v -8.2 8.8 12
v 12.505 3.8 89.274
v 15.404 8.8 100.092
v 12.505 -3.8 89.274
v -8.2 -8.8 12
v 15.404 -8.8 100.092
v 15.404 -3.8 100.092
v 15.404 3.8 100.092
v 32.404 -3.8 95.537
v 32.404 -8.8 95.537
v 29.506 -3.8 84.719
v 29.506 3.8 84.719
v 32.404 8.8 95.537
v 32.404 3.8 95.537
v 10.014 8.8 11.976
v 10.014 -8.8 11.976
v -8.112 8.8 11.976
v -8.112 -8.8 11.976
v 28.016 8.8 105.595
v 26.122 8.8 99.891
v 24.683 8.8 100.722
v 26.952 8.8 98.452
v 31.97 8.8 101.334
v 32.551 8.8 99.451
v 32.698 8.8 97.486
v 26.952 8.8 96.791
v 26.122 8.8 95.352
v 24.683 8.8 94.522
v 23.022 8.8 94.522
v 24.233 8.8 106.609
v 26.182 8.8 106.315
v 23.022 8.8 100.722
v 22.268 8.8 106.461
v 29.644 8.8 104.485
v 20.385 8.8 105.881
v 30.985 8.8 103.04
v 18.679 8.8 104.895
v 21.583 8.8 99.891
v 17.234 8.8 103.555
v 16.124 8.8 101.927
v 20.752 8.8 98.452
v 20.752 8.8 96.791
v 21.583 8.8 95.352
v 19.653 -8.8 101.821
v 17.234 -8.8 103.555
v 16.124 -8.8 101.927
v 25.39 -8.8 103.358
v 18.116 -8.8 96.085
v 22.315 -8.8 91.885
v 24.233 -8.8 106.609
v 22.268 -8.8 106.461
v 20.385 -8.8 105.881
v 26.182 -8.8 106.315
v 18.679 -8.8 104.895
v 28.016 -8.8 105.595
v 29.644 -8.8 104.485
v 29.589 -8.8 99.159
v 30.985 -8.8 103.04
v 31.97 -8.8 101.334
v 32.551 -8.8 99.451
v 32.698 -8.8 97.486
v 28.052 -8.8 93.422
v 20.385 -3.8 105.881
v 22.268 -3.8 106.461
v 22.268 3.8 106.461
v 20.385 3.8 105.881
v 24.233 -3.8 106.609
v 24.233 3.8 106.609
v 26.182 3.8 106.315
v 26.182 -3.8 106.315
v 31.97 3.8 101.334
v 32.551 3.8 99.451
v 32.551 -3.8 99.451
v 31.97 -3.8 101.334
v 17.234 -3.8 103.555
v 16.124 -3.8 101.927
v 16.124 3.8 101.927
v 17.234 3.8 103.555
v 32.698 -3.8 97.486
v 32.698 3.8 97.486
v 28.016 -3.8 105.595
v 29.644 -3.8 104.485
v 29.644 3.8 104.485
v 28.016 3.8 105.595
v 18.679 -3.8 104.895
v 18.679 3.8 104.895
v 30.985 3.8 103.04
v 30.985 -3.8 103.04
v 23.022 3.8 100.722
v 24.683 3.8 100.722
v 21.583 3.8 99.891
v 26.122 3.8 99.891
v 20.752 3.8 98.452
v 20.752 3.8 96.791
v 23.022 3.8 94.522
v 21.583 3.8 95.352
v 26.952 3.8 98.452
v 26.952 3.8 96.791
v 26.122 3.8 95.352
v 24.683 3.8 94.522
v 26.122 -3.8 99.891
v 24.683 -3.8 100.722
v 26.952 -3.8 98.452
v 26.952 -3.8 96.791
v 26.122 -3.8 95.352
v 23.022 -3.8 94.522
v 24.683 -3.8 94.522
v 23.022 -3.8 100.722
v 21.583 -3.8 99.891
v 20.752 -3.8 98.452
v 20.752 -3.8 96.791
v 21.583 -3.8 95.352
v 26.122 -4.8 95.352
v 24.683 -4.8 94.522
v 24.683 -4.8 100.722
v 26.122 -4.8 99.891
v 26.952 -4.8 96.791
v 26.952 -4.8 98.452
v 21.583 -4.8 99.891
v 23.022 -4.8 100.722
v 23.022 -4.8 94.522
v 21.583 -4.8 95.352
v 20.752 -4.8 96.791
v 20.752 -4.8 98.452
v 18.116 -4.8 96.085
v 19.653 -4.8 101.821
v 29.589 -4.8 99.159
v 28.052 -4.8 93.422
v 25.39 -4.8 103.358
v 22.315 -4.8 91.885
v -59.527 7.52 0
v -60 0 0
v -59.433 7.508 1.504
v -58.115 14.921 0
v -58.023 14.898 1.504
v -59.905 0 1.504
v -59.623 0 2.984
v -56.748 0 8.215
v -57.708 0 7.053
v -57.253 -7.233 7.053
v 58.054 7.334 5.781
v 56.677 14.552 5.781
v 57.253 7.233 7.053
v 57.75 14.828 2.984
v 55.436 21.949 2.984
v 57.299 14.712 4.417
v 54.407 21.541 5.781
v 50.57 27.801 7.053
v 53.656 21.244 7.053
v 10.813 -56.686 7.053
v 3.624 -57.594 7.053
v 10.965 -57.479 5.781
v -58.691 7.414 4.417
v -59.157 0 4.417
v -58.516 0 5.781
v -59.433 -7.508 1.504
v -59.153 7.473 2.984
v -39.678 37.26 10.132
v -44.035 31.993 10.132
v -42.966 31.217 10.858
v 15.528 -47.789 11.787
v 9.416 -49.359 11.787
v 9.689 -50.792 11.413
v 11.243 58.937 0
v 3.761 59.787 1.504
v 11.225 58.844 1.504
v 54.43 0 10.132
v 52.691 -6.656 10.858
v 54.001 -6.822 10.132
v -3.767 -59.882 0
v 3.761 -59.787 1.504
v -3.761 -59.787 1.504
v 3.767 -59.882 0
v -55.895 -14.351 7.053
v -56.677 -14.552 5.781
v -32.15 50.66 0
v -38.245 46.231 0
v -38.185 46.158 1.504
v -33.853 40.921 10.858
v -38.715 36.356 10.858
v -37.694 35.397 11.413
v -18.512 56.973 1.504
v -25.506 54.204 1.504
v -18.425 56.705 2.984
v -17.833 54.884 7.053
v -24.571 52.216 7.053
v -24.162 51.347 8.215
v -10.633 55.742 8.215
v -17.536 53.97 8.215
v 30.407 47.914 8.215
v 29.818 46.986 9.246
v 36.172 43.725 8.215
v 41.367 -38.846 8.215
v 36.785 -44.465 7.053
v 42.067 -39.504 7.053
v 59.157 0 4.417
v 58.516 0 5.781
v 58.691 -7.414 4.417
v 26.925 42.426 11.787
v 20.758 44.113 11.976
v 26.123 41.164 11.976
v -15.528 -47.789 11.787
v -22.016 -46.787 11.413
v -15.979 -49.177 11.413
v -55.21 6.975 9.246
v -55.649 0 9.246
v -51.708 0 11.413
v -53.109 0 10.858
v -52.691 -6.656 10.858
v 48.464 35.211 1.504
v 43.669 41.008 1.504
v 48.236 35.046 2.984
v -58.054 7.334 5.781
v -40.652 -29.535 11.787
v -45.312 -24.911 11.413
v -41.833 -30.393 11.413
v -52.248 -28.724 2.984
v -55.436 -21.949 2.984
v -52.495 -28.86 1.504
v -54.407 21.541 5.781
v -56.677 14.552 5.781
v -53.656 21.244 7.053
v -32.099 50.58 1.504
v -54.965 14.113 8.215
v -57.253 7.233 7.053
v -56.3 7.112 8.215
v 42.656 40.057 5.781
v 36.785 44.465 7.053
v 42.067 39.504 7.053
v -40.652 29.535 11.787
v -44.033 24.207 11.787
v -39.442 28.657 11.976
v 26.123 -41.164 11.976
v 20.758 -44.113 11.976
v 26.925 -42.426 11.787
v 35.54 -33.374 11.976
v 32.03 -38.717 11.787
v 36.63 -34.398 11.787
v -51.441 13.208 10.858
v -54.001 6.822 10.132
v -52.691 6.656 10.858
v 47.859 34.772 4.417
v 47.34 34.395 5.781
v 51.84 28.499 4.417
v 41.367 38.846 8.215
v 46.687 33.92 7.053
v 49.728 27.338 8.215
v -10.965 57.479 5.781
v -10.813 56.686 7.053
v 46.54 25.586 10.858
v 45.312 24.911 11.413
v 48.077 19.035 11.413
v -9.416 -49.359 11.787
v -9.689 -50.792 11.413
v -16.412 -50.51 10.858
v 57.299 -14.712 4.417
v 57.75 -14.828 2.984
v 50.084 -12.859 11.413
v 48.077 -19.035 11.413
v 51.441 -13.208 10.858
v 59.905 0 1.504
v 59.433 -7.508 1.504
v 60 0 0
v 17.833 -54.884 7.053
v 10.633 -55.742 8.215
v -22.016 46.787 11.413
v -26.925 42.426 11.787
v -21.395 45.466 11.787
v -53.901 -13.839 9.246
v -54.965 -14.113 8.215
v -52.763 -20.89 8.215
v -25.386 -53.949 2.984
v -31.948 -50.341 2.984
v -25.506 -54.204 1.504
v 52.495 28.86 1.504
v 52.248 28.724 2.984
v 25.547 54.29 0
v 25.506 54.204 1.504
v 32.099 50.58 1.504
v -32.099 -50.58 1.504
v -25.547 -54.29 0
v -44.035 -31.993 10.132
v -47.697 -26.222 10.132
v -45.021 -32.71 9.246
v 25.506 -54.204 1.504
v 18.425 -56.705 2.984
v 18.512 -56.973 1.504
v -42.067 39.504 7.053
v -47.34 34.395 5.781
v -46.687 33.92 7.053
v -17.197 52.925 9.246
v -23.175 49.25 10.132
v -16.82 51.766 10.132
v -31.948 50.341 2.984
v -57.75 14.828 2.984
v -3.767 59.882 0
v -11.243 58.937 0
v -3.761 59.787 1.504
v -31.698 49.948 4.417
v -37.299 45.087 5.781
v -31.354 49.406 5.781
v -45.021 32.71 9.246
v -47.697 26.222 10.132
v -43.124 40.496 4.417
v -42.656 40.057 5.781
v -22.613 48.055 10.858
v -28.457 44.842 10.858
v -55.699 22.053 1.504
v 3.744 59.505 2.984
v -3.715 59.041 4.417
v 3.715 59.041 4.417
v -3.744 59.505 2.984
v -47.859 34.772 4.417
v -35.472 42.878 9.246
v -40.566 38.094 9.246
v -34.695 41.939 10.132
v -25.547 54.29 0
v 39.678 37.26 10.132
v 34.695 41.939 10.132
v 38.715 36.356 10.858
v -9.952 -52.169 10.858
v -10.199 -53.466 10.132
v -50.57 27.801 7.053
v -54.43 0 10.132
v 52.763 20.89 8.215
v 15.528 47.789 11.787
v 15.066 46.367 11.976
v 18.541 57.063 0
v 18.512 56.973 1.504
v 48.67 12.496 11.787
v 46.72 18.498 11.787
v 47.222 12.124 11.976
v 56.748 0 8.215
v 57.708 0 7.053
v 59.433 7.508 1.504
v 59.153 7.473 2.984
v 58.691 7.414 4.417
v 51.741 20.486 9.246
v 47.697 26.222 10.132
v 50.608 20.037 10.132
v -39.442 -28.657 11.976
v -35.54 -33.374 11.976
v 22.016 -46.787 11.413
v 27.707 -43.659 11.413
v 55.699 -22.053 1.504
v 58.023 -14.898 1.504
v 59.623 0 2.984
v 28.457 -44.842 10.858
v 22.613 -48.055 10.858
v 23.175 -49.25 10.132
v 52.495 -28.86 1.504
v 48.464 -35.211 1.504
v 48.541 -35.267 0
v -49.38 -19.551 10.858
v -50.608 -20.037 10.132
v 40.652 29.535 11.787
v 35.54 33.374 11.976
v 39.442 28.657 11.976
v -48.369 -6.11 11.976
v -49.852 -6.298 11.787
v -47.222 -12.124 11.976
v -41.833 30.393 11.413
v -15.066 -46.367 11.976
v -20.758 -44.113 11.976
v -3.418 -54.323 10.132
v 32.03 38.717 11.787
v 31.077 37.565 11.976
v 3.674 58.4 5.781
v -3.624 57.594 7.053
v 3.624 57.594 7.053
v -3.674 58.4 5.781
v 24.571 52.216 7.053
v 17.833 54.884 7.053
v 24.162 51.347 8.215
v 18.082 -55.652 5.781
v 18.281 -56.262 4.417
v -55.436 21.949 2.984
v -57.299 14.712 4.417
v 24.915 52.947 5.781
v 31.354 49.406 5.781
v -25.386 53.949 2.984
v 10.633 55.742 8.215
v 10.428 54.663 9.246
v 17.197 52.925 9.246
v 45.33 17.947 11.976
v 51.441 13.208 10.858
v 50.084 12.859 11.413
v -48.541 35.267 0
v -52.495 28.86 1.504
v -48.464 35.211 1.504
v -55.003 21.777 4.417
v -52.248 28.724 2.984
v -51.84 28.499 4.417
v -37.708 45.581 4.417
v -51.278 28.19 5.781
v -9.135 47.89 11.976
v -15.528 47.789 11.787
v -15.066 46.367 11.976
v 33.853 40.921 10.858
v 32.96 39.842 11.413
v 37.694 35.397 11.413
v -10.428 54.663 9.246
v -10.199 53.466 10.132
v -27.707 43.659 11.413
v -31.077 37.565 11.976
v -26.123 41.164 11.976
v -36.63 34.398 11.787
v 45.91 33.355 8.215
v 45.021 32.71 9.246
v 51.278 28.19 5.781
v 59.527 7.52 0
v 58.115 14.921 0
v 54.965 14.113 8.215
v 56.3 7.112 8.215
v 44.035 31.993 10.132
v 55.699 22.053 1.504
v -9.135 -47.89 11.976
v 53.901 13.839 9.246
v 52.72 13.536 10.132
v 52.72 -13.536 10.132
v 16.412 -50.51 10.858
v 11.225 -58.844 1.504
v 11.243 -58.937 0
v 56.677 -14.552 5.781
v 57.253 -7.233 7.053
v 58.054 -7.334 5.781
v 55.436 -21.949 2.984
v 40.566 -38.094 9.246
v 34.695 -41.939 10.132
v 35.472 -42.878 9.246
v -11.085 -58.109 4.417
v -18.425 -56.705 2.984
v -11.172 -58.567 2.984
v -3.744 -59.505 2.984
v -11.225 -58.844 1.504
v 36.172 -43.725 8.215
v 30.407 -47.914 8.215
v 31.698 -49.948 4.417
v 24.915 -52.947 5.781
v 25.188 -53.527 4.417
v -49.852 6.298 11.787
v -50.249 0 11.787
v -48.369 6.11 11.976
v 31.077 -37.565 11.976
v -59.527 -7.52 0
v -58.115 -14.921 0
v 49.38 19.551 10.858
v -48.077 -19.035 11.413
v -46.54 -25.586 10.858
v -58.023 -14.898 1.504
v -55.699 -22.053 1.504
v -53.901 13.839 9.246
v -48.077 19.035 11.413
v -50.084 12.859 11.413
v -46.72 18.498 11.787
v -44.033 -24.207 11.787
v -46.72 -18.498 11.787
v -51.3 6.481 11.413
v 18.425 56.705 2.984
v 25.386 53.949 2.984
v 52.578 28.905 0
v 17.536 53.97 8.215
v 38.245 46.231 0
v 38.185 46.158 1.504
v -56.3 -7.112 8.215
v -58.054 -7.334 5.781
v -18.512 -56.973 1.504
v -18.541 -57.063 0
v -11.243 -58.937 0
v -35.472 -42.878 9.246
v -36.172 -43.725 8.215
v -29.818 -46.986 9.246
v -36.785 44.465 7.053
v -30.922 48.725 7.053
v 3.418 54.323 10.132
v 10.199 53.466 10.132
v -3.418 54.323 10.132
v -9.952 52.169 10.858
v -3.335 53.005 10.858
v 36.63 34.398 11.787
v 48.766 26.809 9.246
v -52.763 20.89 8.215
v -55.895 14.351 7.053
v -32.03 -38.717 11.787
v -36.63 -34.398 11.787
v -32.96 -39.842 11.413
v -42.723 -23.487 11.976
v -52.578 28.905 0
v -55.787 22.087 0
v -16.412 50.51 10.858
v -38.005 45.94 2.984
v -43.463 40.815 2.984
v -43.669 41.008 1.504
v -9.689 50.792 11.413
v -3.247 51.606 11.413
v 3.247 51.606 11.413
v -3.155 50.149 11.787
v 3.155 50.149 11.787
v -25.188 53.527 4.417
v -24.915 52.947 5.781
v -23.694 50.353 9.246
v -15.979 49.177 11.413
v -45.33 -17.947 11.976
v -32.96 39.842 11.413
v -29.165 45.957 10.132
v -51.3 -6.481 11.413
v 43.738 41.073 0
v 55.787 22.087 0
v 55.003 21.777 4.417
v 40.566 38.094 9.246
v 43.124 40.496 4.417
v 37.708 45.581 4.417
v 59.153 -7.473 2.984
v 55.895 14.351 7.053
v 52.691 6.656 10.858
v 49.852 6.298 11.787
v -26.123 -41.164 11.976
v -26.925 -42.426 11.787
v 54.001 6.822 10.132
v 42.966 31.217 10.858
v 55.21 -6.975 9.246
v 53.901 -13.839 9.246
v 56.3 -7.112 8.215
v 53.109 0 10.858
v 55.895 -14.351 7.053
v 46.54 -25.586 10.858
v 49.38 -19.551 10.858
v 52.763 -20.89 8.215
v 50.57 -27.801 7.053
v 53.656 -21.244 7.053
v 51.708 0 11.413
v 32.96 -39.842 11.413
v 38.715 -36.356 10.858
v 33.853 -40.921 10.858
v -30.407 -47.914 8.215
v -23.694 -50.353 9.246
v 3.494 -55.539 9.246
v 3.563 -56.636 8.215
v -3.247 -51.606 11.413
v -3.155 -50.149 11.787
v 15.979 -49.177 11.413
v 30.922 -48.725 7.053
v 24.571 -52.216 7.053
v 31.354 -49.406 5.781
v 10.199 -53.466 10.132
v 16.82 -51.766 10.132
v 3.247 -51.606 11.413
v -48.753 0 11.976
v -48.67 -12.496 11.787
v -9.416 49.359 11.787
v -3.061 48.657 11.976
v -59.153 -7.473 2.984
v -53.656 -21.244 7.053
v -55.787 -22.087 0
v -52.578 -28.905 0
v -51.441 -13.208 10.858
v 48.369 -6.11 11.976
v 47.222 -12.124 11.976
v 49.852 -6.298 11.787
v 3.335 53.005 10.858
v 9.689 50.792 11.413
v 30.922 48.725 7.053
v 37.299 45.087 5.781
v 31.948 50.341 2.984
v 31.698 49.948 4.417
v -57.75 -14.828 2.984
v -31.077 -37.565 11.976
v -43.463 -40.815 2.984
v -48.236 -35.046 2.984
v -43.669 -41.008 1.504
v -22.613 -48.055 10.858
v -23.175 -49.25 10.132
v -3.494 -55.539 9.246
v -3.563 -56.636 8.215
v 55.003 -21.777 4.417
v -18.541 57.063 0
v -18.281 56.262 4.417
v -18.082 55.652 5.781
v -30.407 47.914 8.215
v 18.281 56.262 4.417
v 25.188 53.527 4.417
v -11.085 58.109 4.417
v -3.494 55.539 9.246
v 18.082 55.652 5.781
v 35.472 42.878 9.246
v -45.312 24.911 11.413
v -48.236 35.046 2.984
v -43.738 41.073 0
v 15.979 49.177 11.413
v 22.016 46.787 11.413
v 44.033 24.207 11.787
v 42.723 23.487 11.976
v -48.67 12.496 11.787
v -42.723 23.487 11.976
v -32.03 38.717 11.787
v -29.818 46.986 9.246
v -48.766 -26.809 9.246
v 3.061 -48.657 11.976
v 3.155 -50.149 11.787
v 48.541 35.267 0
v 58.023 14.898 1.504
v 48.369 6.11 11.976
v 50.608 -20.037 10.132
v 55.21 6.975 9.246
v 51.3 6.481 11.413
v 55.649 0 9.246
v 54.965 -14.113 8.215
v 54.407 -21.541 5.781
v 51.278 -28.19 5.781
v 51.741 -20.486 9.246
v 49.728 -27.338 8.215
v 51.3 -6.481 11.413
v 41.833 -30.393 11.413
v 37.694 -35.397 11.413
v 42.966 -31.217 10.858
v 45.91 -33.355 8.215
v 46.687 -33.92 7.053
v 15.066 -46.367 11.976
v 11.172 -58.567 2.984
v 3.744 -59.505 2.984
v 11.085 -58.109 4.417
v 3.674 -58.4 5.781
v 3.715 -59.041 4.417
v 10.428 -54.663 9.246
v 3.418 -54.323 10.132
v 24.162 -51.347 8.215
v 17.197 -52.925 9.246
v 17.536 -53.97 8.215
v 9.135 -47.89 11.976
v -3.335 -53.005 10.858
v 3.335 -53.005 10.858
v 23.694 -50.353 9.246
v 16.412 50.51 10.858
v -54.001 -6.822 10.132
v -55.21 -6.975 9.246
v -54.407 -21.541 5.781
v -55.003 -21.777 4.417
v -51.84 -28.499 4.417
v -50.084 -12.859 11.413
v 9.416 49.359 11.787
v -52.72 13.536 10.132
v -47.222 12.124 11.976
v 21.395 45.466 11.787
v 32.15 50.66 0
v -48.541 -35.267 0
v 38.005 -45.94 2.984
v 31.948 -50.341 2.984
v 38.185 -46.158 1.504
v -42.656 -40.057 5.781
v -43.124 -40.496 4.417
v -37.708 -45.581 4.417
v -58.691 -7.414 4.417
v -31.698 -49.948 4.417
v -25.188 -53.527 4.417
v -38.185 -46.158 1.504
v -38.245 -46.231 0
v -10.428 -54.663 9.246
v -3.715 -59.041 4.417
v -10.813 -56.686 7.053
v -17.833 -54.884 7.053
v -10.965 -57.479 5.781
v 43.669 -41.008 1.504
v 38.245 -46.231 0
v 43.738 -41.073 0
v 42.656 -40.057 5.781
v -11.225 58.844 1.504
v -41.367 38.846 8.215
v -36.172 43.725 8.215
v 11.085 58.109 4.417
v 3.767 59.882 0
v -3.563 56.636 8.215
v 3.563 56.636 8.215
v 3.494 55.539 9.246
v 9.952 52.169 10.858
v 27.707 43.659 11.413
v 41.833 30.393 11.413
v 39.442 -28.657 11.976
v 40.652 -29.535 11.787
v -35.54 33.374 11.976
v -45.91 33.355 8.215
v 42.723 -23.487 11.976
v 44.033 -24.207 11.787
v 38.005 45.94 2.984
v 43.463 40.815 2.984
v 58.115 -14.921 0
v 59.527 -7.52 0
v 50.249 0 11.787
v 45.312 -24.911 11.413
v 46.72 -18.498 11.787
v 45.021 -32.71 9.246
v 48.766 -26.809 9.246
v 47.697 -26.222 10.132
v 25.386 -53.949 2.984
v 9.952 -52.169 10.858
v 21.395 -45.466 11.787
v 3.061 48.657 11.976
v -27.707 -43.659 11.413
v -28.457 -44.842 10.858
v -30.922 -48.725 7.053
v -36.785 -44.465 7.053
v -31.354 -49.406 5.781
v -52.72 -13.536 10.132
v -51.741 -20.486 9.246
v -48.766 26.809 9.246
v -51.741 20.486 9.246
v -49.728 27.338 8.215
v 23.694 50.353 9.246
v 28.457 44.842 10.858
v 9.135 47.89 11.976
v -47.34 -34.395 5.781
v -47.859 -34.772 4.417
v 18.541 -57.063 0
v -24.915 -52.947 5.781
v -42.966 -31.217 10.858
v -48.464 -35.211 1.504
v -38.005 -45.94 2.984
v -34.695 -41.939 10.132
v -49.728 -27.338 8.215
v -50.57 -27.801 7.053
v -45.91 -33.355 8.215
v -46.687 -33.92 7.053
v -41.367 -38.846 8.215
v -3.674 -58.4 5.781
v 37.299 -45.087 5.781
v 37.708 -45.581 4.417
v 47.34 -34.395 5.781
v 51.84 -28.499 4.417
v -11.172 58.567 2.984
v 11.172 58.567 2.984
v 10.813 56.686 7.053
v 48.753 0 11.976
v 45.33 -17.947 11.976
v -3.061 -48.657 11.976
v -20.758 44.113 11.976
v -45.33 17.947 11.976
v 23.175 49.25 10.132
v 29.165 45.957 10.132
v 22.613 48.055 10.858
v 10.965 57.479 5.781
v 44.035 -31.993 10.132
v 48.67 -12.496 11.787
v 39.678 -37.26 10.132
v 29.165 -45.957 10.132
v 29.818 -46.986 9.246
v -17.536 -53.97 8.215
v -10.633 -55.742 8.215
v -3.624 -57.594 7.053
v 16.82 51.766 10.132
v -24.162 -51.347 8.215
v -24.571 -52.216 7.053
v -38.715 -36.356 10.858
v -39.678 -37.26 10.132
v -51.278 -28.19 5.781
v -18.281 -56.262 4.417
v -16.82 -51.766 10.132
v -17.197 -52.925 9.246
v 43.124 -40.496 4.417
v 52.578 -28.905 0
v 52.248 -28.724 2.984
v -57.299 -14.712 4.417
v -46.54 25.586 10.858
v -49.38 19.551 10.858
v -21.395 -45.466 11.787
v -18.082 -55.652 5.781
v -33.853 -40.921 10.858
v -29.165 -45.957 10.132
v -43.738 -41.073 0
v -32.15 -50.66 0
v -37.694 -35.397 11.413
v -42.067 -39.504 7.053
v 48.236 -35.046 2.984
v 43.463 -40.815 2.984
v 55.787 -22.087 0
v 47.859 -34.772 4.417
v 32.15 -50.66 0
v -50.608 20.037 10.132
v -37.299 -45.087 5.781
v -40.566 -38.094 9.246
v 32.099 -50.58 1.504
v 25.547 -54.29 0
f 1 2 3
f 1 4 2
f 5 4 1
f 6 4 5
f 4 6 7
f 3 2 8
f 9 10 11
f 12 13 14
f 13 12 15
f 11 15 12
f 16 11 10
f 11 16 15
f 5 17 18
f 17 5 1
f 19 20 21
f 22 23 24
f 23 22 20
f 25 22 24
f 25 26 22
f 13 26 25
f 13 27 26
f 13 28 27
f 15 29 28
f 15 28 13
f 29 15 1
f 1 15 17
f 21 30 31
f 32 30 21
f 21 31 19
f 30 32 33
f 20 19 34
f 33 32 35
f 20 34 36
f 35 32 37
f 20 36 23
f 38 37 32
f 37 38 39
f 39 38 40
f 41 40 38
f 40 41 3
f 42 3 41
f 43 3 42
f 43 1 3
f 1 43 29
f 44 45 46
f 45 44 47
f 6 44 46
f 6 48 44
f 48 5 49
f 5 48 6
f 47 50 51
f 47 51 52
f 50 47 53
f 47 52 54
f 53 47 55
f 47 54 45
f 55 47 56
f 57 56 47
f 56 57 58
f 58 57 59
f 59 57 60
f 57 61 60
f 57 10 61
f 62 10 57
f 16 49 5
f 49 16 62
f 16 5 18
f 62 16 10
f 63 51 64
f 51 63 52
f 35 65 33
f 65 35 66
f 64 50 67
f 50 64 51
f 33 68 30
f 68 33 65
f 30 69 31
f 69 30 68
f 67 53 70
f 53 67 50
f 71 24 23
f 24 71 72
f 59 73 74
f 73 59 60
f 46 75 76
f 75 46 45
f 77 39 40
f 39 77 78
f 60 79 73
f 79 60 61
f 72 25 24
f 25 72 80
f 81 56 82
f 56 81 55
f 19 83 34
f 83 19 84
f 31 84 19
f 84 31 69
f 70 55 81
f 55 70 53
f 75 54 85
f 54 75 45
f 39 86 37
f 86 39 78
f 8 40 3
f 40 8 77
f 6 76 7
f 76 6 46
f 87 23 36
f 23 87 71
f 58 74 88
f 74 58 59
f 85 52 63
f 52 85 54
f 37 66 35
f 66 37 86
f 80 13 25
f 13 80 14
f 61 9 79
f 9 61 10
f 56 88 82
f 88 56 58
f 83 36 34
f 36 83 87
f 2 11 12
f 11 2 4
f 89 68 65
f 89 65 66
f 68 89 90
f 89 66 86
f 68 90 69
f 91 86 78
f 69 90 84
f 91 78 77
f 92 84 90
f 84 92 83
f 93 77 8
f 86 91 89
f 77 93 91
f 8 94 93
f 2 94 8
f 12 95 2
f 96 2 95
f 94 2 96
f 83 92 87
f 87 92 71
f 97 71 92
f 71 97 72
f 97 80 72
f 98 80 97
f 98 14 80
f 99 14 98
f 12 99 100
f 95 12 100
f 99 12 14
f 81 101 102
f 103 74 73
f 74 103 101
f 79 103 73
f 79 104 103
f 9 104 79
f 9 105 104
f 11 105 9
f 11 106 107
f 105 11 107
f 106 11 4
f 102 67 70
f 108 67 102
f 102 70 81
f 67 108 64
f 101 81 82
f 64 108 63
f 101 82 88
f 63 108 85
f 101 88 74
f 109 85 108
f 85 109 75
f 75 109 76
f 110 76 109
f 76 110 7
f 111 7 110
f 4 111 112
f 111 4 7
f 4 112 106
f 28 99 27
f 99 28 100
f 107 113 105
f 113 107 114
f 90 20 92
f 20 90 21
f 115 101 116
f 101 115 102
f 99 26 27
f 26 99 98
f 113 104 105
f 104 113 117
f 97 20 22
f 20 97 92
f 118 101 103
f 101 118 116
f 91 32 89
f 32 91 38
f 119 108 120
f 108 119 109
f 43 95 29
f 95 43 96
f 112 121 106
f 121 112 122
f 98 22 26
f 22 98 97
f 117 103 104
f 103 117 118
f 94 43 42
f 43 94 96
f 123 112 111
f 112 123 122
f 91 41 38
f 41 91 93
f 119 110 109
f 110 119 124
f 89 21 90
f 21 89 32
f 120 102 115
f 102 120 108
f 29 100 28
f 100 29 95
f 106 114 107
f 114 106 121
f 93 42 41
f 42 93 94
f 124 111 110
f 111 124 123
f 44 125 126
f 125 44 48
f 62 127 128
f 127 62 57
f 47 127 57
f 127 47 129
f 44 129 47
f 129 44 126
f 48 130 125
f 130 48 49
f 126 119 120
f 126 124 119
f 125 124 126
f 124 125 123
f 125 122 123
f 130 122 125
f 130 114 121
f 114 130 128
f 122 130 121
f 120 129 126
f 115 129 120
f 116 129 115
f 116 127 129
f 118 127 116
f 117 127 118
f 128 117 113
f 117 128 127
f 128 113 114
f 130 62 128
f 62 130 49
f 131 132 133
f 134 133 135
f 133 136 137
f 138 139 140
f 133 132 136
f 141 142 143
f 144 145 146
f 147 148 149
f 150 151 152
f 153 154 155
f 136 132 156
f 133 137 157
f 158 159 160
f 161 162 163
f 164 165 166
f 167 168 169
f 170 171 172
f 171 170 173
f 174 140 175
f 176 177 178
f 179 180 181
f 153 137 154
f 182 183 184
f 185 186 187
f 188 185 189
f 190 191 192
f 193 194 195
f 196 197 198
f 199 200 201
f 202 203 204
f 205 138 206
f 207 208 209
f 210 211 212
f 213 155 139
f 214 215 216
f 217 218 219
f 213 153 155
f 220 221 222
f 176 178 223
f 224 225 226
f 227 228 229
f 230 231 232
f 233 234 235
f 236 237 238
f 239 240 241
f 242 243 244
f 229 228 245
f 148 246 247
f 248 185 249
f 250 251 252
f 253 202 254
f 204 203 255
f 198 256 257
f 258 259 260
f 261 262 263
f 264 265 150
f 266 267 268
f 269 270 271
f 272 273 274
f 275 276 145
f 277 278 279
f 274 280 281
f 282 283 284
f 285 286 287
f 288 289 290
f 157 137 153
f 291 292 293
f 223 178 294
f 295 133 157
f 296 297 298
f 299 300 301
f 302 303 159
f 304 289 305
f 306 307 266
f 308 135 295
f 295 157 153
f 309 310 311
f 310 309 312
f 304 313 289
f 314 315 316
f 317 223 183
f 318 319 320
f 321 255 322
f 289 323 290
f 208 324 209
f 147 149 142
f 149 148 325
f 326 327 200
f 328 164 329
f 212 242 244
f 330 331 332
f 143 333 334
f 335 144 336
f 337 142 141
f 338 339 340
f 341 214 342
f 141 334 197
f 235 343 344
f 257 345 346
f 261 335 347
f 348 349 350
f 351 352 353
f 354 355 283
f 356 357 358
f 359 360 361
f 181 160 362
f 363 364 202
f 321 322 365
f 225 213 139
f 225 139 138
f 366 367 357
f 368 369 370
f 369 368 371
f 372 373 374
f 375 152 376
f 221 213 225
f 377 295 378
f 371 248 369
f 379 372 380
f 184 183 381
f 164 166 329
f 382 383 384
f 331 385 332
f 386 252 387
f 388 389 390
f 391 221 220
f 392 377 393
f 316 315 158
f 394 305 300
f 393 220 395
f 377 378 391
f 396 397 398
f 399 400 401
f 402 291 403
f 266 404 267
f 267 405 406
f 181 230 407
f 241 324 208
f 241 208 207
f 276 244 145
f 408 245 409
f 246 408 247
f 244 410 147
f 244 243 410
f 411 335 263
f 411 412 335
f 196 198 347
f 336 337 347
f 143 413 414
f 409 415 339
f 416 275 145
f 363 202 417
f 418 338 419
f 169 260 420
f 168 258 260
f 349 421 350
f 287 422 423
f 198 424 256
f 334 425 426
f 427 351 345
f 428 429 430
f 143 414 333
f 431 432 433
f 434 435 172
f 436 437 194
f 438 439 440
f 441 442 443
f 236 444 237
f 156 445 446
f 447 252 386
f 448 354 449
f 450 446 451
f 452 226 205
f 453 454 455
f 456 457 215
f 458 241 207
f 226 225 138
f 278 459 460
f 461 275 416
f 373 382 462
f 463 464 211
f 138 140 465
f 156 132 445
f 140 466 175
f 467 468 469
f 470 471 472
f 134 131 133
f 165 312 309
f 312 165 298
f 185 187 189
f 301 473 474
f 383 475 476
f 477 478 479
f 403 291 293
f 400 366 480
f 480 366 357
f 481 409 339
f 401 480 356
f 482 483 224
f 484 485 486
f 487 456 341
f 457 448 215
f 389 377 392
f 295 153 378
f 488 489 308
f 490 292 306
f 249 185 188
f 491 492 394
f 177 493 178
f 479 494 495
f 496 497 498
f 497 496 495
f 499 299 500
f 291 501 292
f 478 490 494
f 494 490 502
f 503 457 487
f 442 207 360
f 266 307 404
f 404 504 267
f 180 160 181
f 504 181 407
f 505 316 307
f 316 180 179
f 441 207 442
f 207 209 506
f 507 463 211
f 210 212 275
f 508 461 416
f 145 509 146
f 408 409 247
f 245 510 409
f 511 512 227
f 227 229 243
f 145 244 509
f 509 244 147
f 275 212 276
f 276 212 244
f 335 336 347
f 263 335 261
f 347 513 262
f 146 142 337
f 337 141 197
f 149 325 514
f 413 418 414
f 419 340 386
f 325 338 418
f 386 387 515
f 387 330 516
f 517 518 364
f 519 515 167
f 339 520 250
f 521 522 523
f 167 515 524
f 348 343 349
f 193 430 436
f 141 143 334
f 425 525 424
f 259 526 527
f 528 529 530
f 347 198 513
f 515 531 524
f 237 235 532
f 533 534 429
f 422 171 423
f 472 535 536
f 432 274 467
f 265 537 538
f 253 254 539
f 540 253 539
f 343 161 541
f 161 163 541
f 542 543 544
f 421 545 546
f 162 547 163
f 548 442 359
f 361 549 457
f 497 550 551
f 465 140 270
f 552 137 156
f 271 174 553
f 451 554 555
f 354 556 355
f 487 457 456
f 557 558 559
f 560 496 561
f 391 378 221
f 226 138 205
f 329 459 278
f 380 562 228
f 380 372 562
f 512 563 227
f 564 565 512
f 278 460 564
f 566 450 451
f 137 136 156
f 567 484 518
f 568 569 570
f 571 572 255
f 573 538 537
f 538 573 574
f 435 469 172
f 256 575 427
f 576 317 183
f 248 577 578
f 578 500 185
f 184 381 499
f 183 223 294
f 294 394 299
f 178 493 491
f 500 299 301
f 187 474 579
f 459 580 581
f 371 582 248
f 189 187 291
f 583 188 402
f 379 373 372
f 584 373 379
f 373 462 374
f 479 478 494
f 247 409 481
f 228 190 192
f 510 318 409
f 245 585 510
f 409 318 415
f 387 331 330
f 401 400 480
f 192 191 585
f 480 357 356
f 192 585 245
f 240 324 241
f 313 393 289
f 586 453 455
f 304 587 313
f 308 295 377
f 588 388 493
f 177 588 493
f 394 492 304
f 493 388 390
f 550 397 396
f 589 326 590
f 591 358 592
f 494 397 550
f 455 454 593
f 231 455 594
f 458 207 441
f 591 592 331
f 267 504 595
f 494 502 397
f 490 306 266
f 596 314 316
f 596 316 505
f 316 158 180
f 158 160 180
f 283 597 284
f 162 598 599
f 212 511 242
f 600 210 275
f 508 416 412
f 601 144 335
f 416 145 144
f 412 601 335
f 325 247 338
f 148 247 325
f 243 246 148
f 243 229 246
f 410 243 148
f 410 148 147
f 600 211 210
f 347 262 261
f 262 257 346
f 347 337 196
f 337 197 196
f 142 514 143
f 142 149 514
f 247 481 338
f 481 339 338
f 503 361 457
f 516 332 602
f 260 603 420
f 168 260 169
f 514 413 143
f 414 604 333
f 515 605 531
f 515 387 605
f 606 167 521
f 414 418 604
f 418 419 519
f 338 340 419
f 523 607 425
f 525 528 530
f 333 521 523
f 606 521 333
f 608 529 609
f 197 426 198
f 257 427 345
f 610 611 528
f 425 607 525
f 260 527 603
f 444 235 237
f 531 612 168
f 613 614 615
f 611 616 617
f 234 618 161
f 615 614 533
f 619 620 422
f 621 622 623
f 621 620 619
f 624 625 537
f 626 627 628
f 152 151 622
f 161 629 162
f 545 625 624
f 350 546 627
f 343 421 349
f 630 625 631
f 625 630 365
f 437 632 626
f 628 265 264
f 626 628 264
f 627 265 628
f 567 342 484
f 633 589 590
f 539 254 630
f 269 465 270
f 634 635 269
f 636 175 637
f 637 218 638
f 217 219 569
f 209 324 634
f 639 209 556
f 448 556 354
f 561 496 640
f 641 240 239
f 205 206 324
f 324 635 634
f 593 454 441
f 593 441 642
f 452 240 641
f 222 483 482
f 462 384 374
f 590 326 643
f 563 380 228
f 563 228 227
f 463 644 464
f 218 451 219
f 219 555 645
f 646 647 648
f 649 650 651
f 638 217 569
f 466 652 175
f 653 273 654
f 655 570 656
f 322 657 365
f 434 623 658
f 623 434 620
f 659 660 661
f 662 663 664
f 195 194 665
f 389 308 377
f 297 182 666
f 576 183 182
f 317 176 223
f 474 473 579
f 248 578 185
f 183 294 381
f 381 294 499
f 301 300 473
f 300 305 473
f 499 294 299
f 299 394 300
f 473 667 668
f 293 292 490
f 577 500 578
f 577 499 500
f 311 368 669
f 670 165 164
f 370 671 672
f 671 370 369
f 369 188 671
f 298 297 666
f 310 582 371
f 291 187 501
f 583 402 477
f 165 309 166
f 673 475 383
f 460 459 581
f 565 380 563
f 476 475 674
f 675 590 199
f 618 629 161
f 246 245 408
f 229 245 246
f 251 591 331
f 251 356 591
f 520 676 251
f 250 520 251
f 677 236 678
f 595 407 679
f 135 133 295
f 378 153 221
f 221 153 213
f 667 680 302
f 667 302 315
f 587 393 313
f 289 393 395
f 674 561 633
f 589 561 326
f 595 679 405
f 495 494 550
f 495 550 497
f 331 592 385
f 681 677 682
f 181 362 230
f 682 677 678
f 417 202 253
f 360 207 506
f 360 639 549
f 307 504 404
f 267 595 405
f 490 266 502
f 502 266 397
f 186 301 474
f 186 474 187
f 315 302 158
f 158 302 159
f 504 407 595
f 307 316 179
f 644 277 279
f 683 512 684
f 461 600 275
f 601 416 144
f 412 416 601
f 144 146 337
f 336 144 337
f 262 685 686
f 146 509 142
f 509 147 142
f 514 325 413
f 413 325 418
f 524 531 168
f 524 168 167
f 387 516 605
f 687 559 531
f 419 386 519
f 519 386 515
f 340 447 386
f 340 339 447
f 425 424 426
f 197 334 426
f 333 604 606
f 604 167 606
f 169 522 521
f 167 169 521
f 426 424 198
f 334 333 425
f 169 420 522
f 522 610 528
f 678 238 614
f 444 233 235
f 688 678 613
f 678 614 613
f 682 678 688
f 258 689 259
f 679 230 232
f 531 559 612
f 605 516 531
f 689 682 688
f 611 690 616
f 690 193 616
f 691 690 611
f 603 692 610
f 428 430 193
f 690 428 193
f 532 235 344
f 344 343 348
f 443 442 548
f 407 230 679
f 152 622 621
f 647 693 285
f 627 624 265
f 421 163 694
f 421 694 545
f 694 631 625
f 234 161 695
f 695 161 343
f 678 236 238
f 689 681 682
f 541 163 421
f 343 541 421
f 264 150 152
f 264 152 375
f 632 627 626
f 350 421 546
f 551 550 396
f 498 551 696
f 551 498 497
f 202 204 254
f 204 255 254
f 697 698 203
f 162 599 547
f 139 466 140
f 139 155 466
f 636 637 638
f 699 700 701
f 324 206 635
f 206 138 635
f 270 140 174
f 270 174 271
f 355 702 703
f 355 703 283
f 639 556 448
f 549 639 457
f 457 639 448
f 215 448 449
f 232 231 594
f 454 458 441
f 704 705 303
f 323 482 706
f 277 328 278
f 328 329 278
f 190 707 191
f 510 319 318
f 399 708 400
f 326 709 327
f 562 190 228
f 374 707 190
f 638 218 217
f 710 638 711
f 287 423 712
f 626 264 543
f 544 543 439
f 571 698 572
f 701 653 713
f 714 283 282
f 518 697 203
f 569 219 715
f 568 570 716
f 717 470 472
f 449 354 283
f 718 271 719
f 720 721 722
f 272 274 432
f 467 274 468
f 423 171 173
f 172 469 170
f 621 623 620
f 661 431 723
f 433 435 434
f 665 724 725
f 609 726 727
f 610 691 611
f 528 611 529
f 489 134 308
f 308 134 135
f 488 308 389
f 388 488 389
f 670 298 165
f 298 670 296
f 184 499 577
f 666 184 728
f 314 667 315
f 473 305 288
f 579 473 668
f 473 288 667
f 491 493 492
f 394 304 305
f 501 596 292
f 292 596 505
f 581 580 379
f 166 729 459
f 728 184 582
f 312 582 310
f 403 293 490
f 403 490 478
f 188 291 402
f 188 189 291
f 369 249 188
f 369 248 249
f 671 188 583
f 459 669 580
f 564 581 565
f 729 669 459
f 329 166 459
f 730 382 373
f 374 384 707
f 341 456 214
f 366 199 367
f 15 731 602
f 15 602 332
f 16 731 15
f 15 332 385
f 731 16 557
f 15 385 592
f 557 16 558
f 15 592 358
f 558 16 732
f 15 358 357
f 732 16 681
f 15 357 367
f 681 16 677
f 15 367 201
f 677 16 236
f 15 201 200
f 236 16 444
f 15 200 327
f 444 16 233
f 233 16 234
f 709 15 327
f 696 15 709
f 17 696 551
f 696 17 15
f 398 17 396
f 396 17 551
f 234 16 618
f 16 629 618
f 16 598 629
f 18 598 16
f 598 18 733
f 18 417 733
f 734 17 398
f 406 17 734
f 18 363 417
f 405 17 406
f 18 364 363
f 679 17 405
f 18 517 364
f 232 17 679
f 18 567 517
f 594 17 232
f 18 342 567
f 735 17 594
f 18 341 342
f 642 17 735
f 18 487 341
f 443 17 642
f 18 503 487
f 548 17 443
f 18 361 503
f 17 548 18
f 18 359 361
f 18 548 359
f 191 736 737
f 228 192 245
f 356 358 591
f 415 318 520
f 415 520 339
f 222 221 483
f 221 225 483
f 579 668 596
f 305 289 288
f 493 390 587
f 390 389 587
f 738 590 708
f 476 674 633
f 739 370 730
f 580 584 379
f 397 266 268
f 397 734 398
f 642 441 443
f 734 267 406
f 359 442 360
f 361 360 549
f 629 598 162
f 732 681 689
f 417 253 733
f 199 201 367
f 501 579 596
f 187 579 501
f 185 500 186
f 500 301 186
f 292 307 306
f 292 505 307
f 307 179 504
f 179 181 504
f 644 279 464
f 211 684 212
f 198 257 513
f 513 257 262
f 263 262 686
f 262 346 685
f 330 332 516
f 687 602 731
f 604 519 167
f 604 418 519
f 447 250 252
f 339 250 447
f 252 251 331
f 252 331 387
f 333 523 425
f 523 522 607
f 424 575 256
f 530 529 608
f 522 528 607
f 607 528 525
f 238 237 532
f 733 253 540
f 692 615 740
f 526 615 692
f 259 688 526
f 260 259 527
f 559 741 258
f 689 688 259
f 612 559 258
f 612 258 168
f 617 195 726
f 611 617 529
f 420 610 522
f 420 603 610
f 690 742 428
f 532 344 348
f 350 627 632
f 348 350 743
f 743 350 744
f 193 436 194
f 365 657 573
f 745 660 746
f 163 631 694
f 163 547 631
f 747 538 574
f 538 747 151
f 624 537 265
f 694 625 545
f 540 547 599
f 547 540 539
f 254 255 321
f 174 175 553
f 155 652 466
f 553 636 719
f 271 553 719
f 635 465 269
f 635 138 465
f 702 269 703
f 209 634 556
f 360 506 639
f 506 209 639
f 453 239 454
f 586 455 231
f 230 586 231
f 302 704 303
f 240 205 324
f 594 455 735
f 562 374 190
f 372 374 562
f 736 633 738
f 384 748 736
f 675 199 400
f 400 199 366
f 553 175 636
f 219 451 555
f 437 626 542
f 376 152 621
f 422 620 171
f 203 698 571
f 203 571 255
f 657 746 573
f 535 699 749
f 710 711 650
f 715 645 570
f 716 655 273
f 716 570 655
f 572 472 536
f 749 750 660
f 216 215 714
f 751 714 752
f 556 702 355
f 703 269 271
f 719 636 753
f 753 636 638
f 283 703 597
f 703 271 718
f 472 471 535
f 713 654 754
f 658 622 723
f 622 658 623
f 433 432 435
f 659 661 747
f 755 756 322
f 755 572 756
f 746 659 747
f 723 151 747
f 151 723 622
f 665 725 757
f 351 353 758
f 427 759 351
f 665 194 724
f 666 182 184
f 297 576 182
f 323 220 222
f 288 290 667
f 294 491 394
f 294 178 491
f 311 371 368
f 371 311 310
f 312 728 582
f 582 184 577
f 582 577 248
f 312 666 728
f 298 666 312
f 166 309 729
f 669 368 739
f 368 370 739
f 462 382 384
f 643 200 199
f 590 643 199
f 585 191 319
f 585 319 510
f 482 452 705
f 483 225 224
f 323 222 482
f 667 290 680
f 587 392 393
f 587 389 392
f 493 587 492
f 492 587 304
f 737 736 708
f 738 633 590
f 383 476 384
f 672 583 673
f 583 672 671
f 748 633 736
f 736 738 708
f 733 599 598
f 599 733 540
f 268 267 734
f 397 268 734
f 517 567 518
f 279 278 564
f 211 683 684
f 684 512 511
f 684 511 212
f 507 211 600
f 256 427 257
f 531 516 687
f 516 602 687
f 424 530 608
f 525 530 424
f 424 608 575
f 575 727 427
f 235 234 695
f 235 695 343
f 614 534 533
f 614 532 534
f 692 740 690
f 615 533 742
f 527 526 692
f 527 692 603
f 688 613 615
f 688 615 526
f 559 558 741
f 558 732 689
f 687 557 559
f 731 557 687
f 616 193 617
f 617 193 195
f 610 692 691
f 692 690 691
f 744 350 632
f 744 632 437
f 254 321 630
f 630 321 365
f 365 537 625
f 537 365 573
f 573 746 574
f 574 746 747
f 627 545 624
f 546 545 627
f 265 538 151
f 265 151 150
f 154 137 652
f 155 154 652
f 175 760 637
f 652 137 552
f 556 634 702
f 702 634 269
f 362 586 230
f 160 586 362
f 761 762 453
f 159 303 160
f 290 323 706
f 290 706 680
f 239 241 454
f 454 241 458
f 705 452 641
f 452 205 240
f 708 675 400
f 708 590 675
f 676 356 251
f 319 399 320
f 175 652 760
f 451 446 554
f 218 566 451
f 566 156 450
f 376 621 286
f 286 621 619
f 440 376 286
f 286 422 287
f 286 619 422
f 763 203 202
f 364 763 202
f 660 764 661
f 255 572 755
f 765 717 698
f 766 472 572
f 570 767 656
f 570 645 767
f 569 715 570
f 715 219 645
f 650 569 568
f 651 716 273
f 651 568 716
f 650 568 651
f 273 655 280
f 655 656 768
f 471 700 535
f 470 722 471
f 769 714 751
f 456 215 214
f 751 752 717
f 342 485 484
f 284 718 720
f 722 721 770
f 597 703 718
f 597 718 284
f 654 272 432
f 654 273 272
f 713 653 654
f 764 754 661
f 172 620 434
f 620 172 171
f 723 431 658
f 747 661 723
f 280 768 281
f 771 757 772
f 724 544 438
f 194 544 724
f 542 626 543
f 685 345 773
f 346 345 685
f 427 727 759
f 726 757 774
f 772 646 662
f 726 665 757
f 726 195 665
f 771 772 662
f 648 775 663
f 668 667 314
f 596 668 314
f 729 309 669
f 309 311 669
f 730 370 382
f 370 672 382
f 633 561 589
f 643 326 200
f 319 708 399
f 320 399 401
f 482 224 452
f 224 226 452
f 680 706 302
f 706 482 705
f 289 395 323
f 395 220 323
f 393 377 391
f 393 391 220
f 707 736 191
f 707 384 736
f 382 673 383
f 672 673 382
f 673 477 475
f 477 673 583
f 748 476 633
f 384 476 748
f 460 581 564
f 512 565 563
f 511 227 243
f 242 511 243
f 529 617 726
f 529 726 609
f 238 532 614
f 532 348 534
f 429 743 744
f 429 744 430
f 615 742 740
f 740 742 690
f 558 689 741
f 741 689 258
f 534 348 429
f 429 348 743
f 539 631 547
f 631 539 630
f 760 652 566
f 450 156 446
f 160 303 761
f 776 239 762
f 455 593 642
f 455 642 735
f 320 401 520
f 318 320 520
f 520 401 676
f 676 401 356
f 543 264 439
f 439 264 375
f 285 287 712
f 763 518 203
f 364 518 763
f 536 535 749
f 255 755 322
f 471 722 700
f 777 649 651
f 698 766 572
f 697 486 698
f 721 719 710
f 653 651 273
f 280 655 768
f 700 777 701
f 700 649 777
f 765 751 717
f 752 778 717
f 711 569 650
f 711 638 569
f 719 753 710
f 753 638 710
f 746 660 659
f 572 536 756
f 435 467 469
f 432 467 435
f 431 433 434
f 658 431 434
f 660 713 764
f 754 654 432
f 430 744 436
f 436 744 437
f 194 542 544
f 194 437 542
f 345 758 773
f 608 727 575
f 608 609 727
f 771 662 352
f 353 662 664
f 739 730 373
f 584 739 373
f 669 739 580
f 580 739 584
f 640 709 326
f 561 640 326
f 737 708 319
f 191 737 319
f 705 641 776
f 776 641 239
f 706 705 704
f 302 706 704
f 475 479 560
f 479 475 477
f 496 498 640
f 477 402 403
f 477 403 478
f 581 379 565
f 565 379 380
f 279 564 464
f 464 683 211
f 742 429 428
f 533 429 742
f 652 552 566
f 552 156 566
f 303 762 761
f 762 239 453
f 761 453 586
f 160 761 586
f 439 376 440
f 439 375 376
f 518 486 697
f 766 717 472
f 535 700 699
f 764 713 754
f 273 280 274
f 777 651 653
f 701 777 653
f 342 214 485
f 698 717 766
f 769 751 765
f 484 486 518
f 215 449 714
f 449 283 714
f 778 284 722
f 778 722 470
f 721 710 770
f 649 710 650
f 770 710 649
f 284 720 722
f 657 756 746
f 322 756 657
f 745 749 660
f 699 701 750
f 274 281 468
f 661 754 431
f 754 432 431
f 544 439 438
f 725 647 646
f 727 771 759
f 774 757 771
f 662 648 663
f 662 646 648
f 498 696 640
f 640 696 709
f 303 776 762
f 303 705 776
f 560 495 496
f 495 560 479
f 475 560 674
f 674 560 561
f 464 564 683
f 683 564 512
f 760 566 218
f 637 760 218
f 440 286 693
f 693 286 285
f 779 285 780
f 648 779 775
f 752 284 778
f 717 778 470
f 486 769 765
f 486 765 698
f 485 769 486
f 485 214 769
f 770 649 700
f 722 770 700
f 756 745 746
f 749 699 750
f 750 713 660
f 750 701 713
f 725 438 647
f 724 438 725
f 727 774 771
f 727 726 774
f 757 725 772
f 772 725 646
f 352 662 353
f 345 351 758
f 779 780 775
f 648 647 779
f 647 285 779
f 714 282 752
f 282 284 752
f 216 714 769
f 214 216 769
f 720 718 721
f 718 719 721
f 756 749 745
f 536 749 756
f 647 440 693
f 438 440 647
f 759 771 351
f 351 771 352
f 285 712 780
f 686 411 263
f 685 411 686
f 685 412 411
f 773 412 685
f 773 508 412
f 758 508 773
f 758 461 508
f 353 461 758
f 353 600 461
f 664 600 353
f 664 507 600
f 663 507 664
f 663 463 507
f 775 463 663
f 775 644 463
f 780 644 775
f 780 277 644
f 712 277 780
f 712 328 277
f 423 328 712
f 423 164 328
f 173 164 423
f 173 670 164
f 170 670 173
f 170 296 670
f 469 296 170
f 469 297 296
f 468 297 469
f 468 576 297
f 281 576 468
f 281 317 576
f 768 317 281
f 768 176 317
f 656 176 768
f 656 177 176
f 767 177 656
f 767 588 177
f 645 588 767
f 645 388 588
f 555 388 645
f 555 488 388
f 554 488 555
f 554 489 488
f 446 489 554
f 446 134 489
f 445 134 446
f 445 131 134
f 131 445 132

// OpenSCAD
//-----------------------------------------------------------------------------------
//libraries
//-----------------------------------------------------------------------------------
//polyholes lib is in local dir
use <MCAD/polyholes.scad>

//-----------------------------------------------------------------------------------
//global configuration settings
//-----------------------------------------------------------------------------------
//epsilon param, so differences are scaled and do not become manifold
de = 0.1; 

//-----------------------------------------------------------------------------------
//parametric settings (object dimensions)
//-----------------------------------------------------------------------------------
//length of arm section
P10 = 80;  
//length of bracket section
P12 = 20; 
//thickness of bracket arms
P20 = 5;
//clearance between bracket arms
P21 = 7.6; 
//height of foot
P30 = 2*P20+P21;
//distance of holes from top end of bracket arms
P40 = 9;
//holes diameter
P41 = 6.2; 
//bracket nut trap wrench size
P42 = 10.2; 
//bracket nut trap depth
P43 = 4;     
//Angle of arm (0..90)
Angle=75;

//Base Radius
BaseRadius=60;
//Base Height, radius of profile
BaseH=12;
module micholder()
{
    difference()
    {
        union()
        {
            //main body
            //translate([0, 0, 0])
                cube([P10+P12-P30/2, 2*P20+P21, P30]);
				translate([P10+P12-P30/2, P30, P30/2])
					 rotate([90,0,0])
						cylinder(r=P30/2, h= P30);
        }  //union 1

        union()
        {
            //cutout for bracket arms
            translate([P10, P20, -de])
                cube([P12+de, P21, P30+2*de]);

            //bracket arms bores
            translate([P10+P12-P40, -de, P30/2])
                rotate([-90, 0, 0])
                polyhole(d=P41, h=2*P20+P21+2*de);
            //and nut trap on south arm
            translate([P10+P12-P40, -de, P30/2])
                rotate([-90,0,0])
                cylinder(r = P42 / 2 / cos(180 / 6) + 0.05, h=P43+de, $fn=6);
 
        }  //union 2
    }  //difference
}

module base(r,R) {
	difference(){
		hull()
		rotate_extrude(convexity = 10, $fn=50)
			translate([R-r,0,0]) circle(r=r);
		translate([0,0,-r]) cylinder(r=2*R, h=r);
	}
}

difference(){
union(){
	translate([(2*P20+P21)/2,-P30/2, BaseH-cos(Angle)*P30]) rotate([0,-Angle,0]) micholder();
	base(BaseH,BaseRadius);
}
translate([0,0,-2*P30]) cylinder(r=BaseRadius, h=2*P30);
}
